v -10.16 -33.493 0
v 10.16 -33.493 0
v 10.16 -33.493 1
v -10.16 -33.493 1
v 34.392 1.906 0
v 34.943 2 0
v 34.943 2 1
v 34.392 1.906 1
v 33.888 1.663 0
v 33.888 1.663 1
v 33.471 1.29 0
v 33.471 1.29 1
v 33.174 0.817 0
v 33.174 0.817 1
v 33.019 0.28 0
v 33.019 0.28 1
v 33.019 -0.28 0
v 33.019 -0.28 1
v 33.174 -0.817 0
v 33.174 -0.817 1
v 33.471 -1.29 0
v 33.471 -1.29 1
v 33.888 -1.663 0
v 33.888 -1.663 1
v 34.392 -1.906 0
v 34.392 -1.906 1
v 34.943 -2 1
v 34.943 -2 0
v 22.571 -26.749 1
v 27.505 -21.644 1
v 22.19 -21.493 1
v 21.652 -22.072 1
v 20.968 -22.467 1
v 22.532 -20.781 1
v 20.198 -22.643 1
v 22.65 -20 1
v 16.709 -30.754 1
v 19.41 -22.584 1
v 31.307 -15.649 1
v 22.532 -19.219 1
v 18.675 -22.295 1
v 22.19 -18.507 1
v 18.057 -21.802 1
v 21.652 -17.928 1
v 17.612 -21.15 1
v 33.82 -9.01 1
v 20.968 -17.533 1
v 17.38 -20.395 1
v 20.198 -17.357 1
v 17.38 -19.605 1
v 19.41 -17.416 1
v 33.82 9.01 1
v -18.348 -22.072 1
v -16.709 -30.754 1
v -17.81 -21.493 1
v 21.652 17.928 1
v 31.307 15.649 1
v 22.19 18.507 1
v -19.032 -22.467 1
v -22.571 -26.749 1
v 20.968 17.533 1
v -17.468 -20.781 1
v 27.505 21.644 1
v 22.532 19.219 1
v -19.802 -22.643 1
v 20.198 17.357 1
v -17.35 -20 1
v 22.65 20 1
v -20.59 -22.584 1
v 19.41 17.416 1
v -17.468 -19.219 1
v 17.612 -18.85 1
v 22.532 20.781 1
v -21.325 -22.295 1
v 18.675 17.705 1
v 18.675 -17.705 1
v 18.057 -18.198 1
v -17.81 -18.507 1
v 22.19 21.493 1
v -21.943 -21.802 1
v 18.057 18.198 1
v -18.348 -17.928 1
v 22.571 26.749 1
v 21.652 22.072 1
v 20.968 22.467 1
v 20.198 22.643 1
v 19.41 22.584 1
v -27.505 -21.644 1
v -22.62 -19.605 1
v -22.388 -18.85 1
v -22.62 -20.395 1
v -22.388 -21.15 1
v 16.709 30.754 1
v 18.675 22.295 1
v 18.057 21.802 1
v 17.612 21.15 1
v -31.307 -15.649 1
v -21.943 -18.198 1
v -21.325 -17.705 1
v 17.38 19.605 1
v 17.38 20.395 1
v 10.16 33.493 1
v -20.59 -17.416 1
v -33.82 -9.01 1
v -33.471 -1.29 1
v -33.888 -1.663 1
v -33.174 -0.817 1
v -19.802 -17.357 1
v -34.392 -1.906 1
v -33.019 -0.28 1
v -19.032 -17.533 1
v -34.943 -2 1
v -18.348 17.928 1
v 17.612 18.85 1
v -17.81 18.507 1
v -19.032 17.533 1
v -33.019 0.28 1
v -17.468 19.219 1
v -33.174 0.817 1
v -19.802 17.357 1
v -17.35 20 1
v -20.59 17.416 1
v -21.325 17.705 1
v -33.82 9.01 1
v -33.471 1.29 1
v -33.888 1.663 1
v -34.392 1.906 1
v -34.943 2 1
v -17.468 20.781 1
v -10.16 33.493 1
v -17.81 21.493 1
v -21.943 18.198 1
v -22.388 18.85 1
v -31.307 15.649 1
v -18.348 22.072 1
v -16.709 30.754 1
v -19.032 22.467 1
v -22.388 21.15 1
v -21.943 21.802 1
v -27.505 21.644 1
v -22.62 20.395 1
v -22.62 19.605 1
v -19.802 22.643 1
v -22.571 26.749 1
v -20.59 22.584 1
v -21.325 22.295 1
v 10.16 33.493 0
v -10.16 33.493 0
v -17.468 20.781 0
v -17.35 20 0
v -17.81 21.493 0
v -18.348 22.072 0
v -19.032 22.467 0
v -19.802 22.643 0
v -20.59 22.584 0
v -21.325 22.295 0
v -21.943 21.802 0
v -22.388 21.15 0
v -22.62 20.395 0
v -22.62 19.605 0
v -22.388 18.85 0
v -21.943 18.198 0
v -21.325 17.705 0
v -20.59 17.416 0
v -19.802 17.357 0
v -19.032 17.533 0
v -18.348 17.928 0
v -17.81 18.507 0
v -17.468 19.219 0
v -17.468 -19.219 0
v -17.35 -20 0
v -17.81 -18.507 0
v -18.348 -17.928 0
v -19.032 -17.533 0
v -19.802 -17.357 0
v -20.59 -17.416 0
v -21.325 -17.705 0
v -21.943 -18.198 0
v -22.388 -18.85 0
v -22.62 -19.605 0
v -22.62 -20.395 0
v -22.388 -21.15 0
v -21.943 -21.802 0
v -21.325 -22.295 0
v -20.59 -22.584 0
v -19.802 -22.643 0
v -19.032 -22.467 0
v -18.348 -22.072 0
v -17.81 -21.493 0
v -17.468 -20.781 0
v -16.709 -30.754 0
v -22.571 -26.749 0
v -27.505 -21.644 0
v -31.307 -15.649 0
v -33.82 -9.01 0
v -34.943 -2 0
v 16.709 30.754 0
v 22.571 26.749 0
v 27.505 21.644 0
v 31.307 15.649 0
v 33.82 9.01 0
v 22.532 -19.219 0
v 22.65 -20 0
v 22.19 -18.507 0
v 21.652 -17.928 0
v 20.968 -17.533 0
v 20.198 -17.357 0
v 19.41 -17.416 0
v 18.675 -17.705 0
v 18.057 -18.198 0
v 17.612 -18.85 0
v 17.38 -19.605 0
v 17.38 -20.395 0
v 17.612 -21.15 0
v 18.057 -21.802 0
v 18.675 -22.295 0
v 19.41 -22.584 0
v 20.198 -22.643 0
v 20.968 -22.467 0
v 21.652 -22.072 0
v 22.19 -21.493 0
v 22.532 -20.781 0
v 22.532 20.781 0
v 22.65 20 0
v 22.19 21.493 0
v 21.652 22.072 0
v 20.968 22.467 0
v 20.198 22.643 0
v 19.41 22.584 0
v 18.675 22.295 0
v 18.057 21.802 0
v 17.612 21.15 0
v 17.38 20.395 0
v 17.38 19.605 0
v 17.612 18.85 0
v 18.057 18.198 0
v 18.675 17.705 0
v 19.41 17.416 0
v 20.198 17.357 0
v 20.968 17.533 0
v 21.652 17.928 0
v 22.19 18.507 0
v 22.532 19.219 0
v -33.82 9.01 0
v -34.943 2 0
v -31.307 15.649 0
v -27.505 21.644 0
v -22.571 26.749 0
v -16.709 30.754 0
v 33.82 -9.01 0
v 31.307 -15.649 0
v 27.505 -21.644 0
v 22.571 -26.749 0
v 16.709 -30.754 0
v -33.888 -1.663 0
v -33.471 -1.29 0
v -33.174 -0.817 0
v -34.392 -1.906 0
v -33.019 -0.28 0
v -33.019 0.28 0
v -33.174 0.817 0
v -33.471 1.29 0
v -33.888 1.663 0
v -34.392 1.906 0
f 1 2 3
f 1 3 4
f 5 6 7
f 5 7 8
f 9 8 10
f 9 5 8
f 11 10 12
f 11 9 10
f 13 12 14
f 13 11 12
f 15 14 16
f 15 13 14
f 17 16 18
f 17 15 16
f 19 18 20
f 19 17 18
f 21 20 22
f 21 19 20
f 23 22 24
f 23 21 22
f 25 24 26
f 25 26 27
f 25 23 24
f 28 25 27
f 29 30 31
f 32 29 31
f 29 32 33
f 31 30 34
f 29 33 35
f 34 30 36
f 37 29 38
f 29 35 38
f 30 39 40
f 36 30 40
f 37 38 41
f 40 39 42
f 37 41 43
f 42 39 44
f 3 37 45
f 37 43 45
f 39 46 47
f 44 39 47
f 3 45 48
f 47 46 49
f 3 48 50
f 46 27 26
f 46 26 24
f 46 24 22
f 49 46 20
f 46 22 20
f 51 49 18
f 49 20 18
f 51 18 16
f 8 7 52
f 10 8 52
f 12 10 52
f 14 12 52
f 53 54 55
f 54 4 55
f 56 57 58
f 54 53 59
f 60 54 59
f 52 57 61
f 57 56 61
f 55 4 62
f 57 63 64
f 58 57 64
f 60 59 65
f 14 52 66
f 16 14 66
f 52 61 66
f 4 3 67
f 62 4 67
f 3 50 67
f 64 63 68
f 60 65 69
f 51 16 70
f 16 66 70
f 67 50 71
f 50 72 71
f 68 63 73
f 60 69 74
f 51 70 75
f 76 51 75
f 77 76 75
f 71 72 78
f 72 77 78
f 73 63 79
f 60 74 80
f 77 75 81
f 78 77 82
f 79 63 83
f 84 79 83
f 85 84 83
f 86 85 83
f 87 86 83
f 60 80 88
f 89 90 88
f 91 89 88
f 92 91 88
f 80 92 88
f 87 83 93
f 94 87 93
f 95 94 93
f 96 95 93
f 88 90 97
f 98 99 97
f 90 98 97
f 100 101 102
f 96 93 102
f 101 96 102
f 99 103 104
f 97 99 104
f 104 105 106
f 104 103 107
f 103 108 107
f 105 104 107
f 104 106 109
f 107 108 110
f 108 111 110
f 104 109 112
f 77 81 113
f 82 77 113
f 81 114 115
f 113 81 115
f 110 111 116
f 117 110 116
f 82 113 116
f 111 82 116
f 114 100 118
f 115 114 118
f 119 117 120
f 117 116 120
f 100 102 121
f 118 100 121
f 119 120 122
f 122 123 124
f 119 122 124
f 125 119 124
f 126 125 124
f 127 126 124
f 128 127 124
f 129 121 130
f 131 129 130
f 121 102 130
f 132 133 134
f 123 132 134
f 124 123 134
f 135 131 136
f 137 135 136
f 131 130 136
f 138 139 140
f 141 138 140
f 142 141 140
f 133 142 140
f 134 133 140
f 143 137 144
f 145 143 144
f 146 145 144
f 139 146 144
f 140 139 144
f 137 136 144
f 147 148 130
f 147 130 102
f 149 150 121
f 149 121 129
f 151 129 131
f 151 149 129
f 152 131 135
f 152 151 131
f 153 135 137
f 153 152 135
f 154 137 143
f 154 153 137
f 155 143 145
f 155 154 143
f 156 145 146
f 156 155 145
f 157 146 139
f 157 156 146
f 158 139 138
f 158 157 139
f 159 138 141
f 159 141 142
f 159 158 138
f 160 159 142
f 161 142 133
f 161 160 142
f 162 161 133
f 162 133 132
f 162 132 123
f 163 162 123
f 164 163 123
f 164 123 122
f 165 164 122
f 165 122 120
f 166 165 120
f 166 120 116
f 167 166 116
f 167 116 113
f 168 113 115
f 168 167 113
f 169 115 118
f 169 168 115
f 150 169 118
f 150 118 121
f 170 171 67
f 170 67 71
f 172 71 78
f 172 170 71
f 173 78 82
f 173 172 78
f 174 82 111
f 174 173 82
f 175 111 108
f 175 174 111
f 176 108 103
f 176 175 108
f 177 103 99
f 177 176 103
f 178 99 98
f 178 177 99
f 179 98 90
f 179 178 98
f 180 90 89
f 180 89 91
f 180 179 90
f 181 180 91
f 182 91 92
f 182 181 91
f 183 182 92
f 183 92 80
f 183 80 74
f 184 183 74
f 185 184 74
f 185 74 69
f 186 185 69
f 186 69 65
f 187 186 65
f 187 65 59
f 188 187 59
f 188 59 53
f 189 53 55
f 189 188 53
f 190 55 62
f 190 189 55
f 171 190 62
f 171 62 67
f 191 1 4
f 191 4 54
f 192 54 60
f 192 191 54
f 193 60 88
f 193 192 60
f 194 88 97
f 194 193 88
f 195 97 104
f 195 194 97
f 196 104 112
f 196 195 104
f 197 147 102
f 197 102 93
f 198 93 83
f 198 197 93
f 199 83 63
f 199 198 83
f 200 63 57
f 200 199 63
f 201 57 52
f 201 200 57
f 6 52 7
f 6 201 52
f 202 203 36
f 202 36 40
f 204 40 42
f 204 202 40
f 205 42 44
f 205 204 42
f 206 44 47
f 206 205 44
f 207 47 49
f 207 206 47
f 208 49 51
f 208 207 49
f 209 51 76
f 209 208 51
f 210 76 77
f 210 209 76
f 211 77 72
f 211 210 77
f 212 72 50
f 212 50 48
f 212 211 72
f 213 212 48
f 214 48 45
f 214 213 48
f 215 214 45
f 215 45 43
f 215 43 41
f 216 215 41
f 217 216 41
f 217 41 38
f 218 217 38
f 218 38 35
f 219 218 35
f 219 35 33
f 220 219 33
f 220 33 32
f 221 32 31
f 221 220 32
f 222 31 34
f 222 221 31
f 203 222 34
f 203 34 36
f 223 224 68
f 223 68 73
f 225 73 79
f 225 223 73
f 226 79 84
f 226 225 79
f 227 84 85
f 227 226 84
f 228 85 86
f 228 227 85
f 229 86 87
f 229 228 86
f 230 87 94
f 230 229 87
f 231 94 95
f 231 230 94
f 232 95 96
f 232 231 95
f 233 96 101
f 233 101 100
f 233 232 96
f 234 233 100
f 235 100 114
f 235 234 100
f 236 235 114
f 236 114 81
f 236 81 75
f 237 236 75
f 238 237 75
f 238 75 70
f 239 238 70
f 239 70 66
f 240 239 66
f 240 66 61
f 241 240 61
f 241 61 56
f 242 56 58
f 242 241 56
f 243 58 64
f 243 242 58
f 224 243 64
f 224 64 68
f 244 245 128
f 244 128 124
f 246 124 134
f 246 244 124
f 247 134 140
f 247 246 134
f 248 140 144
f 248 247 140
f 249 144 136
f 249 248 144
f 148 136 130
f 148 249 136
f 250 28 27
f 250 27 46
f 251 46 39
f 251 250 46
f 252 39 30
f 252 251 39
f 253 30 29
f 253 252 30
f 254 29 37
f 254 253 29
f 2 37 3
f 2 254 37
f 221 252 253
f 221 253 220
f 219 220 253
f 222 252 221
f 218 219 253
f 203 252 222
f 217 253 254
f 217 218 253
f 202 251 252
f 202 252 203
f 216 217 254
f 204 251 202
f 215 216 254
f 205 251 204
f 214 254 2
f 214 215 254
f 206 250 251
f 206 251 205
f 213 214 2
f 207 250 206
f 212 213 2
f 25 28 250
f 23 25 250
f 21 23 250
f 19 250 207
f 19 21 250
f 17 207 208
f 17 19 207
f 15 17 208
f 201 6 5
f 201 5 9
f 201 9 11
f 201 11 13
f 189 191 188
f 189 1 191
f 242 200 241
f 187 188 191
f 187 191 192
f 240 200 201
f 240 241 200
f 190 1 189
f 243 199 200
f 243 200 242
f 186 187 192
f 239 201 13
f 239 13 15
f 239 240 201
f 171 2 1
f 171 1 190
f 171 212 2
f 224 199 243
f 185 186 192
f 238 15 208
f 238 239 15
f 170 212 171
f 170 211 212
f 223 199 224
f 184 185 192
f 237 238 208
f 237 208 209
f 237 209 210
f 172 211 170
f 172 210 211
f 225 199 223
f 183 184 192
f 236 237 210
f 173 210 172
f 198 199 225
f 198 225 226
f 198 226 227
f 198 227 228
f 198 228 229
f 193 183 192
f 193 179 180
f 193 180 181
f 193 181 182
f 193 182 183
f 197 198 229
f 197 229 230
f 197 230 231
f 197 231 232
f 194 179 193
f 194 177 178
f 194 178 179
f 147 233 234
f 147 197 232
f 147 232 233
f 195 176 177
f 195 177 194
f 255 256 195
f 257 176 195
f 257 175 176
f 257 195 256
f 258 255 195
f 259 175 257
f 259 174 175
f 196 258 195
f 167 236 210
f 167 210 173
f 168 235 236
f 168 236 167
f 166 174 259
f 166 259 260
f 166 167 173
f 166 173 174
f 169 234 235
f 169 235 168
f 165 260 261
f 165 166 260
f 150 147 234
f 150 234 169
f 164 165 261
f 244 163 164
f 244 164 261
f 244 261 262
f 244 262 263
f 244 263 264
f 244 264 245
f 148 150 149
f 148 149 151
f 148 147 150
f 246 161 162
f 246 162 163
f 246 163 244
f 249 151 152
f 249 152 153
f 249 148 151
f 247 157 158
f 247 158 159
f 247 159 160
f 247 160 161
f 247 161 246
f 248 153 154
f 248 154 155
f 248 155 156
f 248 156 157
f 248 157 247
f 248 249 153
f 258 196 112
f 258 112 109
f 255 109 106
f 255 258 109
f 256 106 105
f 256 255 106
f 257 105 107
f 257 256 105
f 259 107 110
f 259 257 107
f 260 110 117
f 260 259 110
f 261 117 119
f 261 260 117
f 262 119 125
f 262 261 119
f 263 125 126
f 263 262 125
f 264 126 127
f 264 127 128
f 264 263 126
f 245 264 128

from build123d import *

# Parameters (mm, degrees)
SKETCH1_R           = 2.65
BOSS_EXTRUDE1_DEPTH = 1


with BuildPart() as part:
    # Sketch1 → Boss-Extrude1 (new body)
    with BuildSketch(Plane.XY):
        with BuildLine():
            Line((-10.16, 33.49290074), (10.16, 33.49290074))
            ThreePointArc((10.16, 33.49290074), (27.504846413, 21.644477906), (34.942810419, 2))
            ThreePointArc((34.942810419, 2), (32.999182505, 0), (34.942810419, -2))
            ThreePointArc((34.942810419, -2), (27.504846413, -21.644477906), (10.16, -33.49290074))
            Line((10.16, -33.49290074), (-10.16, -33.49290074))
            ThreePointArc((-10.16, -33.49290074), (-27.504846413, -21.644477906), (-34.942810419, -2))
            ThreePointArc((-34.942810419, -2), (-32.999182505, 0), (-34.942810419, 2))
            ThreePointArc((-34.942810419, 2), (-27.504846413, 21.644477906), (-10.16, 33.49290074))
        make_face()
        with Locations((-20, 20)):
            Circle(SKETCH1_R, mode=Mode.SUBTRACT)
        with Locations((-20, -20)):
            Circle(SKETCH1_R, mode=Mode.SUBTRACT)
        with Locations((20, -20)):
            Circle(SKETCH1_R, mode=Mode.SUBTRACT)
        with Locations((20, 20)):
            Circle(SKETCH1_R, mode=Mode.SUBTRACT)
    extrude(amount=BOSS_EXTRUDE1_DEPTH)


solid = part.part
